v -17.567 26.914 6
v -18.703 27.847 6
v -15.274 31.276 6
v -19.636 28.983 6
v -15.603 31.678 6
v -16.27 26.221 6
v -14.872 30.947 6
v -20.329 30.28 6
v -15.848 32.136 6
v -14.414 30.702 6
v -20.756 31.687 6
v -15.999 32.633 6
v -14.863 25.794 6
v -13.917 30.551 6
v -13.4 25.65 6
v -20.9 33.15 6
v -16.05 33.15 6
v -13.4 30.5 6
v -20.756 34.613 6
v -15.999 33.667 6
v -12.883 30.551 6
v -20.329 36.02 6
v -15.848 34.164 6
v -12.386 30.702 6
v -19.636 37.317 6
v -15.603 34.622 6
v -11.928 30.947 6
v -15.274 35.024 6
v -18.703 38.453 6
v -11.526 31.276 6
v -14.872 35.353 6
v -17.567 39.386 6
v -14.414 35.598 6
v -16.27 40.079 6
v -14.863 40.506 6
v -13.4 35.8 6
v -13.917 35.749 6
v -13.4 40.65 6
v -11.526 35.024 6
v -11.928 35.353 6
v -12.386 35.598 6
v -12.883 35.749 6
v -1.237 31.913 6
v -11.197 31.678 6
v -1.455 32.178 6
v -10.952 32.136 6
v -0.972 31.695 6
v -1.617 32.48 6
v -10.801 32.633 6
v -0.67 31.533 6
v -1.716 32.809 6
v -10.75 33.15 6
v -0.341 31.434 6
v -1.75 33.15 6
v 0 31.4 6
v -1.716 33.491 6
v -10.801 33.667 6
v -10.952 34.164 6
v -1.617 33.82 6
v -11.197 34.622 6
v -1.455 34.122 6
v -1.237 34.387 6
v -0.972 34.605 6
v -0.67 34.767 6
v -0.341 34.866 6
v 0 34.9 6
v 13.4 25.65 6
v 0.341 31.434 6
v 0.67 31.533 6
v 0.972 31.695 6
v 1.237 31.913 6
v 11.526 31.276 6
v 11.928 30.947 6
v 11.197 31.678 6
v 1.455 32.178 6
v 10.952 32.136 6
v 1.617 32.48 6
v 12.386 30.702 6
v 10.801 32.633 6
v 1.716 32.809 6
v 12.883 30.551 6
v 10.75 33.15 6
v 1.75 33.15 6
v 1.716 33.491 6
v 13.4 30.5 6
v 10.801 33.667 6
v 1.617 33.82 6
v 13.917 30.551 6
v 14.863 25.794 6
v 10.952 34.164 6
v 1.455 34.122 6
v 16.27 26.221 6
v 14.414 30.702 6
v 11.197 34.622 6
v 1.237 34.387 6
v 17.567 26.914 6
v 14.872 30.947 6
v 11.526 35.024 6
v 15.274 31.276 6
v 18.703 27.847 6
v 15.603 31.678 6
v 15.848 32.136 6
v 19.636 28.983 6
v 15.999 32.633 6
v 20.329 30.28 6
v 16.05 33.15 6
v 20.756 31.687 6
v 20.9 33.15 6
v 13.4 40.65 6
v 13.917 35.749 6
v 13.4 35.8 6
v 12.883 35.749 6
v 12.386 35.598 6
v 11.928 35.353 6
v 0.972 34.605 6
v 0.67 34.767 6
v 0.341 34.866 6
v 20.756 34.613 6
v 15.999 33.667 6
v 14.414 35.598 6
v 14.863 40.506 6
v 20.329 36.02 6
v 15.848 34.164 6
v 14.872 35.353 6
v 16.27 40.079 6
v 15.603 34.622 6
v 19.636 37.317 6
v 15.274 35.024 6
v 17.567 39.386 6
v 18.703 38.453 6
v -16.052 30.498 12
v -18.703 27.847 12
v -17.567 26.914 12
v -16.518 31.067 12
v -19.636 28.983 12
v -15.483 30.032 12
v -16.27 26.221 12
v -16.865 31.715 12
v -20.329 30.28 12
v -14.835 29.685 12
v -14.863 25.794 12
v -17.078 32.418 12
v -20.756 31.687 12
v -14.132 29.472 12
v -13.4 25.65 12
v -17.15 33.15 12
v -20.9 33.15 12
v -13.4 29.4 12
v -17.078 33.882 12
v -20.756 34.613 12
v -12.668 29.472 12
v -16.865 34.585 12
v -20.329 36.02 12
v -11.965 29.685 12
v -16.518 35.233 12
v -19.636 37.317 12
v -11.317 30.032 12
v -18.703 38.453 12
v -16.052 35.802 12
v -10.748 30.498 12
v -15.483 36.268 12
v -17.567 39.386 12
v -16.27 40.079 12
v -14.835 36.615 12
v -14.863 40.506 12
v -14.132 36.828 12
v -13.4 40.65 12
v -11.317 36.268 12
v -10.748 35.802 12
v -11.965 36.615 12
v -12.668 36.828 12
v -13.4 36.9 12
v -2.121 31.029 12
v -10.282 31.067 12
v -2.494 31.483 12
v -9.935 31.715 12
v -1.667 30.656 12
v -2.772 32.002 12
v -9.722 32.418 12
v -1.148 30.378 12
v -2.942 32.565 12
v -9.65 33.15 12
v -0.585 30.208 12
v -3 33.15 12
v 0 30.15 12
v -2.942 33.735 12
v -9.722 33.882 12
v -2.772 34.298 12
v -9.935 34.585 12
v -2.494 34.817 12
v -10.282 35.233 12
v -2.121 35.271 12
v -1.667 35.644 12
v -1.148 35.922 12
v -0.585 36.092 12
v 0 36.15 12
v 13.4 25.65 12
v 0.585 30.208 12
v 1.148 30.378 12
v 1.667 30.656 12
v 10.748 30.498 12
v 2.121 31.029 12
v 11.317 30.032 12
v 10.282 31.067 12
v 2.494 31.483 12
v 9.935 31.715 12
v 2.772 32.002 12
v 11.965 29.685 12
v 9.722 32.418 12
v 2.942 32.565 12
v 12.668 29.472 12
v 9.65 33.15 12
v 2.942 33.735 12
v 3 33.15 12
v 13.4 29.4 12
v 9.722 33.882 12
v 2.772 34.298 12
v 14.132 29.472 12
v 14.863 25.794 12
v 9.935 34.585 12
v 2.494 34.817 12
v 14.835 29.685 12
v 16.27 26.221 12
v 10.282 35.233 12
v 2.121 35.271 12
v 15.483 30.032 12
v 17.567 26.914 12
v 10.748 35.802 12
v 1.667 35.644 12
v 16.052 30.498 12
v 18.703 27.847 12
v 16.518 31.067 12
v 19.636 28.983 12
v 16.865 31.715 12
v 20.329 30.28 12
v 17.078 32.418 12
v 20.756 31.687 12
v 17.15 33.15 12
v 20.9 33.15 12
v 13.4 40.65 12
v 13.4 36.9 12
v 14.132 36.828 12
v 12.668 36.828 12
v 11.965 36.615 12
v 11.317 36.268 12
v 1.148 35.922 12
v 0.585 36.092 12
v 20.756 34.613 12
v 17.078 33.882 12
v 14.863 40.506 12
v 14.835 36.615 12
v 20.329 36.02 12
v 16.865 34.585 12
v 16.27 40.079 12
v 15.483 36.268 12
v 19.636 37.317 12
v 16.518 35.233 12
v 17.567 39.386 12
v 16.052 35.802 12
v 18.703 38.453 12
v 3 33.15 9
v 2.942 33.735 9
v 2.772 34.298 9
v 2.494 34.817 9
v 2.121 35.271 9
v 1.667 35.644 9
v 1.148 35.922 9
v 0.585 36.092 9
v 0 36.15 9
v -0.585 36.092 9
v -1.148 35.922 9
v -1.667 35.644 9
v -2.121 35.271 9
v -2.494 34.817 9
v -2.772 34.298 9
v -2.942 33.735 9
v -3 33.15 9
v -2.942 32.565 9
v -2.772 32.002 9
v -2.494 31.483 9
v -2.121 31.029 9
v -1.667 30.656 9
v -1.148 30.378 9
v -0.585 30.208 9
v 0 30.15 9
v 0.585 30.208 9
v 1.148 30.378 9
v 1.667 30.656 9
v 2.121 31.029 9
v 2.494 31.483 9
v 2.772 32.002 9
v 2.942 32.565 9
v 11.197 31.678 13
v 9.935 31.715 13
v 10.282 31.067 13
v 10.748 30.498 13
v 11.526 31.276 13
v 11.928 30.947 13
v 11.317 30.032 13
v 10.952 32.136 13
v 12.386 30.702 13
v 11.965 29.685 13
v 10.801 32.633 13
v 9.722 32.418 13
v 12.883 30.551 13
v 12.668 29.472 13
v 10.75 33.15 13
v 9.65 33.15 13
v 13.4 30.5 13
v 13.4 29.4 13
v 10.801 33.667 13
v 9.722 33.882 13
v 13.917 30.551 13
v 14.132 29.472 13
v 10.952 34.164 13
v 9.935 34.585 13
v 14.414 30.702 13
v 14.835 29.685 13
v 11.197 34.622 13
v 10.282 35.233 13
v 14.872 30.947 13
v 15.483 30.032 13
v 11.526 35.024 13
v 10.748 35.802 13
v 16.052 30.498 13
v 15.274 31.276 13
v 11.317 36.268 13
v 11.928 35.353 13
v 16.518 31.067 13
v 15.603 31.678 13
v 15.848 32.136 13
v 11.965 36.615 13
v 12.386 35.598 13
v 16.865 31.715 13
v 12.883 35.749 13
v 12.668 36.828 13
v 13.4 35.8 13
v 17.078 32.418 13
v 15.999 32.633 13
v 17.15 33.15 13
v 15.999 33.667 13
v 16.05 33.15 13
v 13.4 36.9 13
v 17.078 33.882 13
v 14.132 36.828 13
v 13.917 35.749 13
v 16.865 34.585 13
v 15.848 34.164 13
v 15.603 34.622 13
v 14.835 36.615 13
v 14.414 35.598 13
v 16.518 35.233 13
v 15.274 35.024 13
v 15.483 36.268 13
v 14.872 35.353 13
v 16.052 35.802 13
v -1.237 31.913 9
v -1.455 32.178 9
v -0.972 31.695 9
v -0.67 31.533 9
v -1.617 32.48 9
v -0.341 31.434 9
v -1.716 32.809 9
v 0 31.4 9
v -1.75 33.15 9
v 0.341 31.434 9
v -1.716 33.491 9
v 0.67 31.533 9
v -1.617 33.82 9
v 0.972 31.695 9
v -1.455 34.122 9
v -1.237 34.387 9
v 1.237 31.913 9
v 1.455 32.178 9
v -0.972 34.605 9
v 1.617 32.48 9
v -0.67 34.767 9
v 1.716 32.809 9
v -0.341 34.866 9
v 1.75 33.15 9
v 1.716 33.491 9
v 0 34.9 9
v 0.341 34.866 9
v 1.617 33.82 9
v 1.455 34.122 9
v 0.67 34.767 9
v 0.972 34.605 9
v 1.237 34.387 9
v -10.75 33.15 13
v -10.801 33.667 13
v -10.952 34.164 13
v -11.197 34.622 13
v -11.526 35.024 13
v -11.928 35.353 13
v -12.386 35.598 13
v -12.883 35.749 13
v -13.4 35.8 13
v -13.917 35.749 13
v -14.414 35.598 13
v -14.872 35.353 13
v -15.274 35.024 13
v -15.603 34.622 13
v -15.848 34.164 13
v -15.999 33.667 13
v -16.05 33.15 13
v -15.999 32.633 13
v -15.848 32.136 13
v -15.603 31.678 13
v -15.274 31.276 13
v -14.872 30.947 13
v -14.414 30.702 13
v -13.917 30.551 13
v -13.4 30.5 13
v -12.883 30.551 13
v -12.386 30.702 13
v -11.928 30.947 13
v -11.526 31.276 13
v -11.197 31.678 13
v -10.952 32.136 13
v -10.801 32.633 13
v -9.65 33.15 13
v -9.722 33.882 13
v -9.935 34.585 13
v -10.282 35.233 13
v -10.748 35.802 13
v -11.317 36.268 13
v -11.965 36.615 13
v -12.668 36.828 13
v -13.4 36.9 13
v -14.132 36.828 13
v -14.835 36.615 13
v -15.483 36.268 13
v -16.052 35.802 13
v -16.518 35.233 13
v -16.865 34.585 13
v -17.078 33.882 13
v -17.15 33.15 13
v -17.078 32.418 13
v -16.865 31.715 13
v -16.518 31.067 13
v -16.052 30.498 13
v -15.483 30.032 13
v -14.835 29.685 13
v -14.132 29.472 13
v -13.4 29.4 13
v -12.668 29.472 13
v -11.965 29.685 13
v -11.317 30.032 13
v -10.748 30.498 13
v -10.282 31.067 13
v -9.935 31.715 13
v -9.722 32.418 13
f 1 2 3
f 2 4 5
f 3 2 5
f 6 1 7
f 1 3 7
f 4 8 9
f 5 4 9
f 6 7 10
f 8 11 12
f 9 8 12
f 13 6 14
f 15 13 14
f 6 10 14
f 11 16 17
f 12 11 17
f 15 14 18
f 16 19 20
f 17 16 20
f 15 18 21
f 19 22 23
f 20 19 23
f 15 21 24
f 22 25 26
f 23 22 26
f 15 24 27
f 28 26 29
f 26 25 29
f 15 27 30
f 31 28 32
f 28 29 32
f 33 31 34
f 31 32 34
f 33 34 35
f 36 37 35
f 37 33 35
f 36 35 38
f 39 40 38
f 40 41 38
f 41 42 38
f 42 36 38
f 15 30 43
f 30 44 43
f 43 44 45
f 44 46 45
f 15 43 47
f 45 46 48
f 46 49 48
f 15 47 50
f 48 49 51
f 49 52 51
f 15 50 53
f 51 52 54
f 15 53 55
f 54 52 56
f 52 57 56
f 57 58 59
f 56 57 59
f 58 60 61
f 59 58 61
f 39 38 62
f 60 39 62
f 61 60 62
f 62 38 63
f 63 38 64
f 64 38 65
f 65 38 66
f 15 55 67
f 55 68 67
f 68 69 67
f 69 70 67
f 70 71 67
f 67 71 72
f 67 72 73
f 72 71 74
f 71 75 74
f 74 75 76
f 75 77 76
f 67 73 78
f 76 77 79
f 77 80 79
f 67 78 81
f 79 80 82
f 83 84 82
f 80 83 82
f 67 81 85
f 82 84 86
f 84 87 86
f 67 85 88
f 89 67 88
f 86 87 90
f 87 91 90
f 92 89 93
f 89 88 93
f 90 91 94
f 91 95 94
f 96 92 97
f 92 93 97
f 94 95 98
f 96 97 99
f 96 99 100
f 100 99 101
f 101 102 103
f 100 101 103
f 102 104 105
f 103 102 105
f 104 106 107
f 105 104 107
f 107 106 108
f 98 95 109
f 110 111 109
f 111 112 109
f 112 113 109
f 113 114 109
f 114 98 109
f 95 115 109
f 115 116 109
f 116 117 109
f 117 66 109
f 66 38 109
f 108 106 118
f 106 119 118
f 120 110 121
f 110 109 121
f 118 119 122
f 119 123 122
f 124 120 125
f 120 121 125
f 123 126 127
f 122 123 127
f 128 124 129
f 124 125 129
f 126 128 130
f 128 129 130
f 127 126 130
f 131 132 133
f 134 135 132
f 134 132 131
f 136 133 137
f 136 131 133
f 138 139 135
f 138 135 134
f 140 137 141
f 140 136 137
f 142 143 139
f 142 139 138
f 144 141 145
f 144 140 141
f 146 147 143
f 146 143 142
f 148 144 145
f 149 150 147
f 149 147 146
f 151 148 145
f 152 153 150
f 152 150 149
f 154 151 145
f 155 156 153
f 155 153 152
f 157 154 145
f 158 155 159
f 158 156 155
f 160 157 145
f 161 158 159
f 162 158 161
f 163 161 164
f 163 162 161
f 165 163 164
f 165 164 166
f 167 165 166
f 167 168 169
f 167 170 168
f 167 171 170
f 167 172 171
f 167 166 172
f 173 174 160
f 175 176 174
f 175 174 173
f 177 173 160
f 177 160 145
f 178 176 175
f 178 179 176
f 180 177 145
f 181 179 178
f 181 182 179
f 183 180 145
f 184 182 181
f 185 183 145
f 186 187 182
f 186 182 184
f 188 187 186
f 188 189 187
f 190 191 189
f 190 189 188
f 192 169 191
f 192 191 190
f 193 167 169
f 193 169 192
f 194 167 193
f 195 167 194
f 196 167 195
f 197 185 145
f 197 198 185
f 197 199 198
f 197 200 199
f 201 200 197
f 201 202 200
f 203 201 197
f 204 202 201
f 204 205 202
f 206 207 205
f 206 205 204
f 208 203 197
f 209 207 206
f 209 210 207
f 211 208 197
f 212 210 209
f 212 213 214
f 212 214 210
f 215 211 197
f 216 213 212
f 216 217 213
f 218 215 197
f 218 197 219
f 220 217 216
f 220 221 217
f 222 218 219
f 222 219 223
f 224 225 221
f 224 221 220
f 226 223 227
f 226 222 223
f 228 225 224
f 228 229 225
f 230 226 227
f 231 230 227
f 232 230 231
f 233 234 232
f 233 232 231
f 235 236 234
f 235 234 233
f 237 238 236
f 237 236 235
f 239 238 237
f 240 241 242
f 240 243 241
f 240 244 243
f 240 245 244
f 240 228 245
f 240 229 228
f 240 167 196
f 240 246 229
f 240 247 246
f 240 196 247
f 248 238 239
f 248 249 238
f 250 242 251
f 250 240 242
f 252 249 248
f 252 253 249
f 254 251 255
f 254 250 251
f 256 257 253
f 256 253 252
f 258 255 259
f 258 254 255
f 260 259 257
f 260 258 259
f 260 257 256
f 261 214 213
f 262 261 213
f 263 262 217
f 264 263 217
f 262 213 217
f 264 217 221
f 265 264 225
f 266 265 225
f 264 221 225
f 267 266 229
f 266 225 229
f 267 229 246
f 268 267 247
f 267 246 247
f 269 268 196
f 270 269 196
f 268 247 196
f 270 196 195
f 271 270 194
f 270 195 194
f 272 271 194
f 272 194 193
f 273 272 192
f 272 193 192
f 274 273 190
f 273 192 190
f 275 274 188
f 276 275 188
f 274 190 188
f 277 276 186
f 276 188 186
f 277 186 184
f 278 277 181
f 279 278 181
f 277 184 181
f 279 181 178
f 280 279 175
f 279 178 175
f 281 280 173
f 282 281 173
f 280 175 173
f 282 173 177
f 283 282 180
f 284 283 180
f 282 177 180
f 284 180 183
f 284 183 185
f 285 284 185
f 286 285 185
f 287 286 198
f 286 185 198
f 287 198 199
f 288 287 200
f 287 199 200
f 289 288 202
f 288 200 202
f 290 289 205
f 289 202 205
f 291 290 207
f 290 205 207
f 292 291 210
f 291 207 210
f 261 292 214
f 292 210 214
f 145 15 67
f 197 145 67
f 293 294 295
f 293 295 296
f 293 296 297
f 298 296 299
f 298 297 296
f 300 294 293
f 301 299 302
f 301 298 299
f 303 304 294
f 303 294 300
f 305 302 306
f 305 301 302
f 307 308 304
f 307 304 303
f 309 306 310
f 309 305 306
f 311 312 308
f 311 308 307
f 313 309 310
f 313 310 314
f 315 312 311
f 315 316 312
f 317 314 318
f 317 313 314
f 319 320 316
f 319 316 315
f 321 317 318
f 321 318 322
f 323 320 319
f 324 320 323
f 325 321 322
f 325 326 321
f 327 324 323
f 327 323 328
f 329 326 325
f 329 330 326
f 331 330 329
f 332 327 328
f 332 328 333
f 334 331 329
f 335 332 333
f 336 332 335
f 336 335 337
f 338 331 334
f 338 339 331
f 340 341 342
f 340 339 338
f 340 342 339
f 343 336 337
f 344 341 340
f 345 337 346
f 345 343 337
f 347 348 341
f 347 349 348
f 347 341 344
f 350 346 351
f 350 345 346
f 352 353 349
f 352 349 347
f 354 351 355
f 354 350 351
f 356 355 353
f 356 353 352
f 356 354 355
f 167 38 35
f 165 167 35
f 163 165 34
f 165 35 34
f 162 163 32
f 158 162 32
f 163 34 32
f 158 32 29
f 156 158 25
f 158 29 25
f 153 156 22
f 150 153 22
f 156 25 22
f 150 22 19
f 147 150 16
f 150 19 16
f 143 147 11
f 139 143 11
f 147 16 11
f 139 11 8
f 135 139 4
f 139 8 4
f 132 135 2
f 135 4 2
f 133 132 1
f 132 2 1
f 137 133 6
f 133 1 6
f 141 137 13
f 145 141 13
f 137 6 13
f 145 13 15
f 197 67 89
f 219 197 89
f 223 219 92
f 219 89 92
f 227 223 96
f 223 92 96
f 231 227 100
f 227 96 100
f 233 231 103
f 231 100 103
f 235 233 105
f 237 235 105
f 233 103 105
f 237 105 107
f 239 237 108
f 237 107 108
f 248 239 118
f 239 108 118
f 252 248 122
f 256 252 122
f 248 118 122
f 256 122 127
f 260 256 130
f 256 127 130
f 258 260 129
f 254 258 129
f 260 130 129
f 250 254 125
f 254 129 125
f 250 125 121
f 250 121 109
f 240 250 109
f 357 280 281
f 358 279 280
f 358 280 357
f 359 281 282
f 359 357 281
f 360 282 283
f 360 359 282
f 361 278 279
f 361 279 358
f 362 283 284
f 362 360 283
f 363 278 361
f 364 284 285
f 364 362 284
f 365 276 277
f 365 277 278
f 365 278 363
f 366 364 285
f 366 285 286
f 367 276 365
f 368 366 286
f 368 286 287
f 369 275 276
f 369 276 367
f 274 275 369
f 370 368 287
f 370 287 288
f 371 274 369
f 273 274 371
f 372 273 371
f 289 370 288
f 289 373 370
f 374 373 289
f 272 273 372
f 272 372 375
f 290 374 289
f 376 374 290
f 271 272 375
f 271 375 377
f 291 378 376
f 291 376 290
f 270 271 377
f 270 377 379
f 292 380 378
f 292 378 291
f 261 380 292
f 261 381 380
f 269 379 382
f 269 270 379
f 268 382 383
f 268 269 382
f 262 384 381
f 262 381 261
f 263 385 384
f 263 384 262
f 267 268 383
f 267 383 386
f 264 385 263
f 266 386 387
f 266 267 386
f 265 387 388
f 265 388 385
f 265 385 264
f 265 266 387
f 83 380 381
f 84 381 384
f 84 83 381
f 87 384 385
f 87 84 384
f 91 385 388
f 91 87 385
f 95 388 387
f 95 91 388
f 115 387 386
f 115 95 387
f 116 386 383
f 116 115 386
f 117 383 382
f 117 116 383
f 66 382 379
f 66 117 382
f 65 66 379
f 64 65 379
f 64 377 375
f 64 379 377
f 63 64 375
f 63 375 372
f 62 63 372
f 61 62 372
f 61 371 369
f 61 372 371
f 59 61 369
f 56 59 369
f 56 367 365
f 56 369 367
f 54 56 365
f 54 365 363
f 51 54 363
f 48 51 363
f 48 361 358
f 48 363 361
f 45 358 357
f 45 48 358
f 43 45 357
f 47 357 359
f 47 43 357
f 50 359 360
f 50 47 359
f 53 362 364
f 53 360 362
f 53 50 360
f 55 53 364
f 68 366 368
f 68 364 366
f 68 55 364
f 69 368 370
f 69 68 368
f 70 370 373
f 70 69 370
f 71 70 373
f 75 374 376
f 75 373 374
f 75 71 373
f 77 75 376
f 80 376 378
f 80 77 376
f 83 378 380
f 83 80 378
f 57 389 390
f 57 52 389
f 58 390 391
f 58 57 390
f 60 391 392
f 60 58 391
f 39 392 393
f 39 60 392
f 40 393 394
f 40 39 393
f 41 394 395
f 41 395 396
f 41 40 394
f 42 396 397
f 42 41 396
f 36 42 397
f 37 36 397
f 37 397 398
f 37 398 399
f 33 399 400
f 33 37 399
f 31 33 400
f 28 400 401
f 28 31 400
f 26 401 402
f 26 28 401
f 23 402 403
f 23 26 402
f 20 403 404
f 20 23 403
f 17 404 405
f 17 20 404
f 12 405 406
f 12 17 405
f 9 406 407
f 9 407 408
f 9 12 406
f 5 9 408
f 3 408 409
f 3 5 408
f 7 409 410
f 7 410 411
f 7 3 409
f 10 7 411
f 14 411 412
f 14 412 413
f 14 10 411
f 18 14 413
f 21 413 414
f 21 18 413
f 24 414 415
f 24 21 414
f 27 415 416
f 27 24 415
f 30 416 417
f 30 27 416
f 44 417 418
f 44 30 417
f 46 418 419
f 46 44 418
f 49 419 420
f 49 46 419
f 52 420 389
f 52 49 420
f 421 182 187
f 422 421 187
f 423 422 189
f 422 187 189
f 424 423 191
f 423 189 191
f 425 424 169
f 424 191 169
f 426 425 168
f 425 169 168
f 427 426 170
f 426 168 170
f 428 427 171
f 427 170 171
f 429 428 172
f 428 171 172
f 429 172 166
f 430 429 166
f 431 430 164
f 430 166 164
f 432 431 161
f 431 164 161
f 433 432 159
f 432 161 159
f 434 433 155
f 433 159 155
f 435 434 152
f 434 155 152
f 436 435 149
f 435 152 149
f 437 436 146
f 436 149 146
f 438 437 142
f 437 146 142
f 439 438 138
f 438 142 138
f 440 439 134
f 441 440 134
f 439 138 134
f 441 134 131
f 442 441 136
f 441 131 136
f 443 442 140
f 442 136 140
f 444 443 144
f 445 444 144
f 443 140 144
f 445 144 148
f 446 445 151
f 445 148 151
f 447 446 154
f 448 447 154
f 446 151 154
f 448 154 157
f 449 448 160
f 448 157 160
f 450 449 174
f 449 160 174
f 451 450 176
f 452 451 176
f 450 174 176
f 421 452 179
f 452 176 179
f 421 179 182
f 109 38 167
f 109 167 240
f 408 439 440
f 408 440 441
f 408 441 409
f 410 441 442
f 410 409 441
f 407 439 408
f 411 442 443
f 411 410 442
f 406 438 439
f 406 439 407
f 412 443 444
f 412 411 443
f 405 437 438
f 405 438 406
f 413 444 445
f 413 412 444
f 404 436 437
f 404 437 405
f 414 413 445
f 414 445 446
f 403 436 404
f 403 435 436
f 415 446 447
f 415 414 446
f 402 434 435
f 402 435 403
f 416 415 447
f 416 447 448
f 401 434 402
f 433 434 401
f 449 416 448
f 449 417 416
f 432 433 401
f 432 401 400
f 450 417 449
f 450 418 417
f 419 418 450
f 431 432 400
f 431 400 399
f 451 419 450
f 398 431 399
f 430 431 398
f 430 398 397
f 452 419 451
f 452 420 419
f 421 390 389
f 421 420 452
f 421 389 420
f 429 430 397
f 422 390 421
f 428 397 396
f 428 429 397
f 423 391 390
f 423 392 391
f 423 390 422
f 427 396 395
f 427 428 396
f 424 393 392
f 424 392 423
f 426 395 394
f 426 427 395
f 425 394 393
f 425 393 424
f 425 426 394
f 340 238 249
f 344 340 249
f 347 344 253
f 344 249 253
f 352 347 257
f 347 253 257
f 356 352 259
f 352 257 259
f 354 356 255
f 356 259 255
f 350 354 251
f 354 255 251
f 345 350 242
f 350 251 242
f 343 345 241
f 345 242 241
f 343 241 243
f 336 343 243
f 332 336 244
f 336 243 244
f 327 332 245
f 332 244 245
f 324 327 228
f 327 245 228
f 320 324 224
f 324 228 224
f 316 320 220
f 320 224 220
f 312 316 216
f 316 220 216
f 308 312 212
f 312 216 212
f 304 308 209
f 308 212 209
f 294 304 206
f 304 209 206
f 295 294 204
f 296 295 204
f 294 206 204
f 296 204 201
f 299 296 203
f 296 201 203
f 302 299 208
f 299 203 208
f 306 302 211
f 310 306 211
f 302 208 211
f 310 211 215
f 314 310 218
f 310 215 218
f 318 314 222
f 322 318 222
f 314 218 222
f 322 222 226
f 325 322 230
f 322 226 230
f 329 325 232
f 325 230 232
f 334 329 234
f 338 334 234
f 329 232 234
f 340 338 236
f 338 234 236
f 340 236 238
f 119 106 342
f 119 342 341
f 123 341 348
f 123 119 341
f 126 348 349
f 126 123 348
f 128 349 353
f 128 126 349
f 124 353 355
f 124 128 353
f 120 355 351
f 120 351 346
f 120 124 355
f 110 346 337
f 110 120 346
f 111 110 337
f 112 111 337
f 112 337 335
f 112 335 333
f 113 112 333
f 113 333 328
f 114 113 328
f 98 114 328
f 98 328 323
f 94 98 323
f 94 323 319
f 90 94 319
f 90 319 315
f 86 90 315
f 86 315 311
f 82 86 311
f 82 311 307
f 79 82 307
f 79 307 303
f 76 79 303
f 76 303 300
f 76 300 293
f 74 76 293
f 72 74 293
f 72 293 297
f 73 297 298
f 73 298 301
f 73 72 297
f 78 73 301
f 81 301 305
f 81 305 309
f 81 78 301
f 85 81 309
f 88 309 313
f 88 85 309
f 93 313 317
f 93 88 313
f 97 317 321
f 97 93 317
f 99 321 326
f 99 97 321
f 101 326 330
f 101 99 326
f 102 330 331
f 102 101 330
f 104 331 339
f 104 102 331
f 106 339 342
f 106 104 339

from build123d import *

# Parameters (mm, degrees)
SKETCH009_R     = 2.65
SKETCH009_R_2   = 1.75
PAD003_DEPTH    = 6
SKETCH010_R     = 3.75
SKETCH010_R_2   = 2.65
PAD004_DEPTH    = 1
SKETCH011_R     = 3
POCKET006_DEPTH = 3


with BuildPart() as part:
    # Sketch009 (on Face6 of Binder) → Pad003 (new body)
    with BuildSketch(Plane.XY.offset(6)):
        with BuildLine():
            ThreePointArc((-13.4, 40.65), (-20.9, 33.15), (-13.4, 25.65))
            Line((-13.4, 25.65), (13.400012, 25.65))
            ThreePointArc((13.400012, 25.65), (20.9, 33.15), (13.400012, 40.65))
            Line((-13.4, 40.65), (13.400012, 40.65))
        make_face()
        with Locations((-13.4, 33.15)):
            Circle(SKETCH009_R, mode=Mode.SUBTRACT)
        with Locations((13.4, 33.15)):
            Circle(SKETCH009_R, mode=Mode.SUBTRACT)
        with Locations((0, 33.15)):
            Circle(SKETCH009_R_2, mode=Mode.SUBTRACT)
    extrude(amount=PAD003_DEPTH)

    # Sketch010 (on Face9 of Pad003) → Pad004 (join)
    with BuildSketch(Plane.XY.offset(12)):
        with Locations((-13.4, 33.15)):
            Circle(SKETCH010_R)
        with Locations((-13.4, 33.15)):
            Circle(SKETCH010_R_2, mode=Mode.SUBTRACT)
        with Locations((13.4, 33.15)):
            Circle(SKETCH010_R)
        with Locations((13.4, 33.15)):
            Circle(SKETCH010_R_2, mode=Mode.SUBTRACT)
    extrude(amount=PAD004_DEPTH)

    # Sketch011 (on Face5 of Pad004) → Pocket006 (cut)
    with BuildSketch(Plane.XY.offset(12)):
        with Locations((0, 33.15)):
            Circle(SKETCH011_R)
    extrude(amount=-POCKET006_DEPTH, mode=Mode.SUBTRACT)


solid = part.part
